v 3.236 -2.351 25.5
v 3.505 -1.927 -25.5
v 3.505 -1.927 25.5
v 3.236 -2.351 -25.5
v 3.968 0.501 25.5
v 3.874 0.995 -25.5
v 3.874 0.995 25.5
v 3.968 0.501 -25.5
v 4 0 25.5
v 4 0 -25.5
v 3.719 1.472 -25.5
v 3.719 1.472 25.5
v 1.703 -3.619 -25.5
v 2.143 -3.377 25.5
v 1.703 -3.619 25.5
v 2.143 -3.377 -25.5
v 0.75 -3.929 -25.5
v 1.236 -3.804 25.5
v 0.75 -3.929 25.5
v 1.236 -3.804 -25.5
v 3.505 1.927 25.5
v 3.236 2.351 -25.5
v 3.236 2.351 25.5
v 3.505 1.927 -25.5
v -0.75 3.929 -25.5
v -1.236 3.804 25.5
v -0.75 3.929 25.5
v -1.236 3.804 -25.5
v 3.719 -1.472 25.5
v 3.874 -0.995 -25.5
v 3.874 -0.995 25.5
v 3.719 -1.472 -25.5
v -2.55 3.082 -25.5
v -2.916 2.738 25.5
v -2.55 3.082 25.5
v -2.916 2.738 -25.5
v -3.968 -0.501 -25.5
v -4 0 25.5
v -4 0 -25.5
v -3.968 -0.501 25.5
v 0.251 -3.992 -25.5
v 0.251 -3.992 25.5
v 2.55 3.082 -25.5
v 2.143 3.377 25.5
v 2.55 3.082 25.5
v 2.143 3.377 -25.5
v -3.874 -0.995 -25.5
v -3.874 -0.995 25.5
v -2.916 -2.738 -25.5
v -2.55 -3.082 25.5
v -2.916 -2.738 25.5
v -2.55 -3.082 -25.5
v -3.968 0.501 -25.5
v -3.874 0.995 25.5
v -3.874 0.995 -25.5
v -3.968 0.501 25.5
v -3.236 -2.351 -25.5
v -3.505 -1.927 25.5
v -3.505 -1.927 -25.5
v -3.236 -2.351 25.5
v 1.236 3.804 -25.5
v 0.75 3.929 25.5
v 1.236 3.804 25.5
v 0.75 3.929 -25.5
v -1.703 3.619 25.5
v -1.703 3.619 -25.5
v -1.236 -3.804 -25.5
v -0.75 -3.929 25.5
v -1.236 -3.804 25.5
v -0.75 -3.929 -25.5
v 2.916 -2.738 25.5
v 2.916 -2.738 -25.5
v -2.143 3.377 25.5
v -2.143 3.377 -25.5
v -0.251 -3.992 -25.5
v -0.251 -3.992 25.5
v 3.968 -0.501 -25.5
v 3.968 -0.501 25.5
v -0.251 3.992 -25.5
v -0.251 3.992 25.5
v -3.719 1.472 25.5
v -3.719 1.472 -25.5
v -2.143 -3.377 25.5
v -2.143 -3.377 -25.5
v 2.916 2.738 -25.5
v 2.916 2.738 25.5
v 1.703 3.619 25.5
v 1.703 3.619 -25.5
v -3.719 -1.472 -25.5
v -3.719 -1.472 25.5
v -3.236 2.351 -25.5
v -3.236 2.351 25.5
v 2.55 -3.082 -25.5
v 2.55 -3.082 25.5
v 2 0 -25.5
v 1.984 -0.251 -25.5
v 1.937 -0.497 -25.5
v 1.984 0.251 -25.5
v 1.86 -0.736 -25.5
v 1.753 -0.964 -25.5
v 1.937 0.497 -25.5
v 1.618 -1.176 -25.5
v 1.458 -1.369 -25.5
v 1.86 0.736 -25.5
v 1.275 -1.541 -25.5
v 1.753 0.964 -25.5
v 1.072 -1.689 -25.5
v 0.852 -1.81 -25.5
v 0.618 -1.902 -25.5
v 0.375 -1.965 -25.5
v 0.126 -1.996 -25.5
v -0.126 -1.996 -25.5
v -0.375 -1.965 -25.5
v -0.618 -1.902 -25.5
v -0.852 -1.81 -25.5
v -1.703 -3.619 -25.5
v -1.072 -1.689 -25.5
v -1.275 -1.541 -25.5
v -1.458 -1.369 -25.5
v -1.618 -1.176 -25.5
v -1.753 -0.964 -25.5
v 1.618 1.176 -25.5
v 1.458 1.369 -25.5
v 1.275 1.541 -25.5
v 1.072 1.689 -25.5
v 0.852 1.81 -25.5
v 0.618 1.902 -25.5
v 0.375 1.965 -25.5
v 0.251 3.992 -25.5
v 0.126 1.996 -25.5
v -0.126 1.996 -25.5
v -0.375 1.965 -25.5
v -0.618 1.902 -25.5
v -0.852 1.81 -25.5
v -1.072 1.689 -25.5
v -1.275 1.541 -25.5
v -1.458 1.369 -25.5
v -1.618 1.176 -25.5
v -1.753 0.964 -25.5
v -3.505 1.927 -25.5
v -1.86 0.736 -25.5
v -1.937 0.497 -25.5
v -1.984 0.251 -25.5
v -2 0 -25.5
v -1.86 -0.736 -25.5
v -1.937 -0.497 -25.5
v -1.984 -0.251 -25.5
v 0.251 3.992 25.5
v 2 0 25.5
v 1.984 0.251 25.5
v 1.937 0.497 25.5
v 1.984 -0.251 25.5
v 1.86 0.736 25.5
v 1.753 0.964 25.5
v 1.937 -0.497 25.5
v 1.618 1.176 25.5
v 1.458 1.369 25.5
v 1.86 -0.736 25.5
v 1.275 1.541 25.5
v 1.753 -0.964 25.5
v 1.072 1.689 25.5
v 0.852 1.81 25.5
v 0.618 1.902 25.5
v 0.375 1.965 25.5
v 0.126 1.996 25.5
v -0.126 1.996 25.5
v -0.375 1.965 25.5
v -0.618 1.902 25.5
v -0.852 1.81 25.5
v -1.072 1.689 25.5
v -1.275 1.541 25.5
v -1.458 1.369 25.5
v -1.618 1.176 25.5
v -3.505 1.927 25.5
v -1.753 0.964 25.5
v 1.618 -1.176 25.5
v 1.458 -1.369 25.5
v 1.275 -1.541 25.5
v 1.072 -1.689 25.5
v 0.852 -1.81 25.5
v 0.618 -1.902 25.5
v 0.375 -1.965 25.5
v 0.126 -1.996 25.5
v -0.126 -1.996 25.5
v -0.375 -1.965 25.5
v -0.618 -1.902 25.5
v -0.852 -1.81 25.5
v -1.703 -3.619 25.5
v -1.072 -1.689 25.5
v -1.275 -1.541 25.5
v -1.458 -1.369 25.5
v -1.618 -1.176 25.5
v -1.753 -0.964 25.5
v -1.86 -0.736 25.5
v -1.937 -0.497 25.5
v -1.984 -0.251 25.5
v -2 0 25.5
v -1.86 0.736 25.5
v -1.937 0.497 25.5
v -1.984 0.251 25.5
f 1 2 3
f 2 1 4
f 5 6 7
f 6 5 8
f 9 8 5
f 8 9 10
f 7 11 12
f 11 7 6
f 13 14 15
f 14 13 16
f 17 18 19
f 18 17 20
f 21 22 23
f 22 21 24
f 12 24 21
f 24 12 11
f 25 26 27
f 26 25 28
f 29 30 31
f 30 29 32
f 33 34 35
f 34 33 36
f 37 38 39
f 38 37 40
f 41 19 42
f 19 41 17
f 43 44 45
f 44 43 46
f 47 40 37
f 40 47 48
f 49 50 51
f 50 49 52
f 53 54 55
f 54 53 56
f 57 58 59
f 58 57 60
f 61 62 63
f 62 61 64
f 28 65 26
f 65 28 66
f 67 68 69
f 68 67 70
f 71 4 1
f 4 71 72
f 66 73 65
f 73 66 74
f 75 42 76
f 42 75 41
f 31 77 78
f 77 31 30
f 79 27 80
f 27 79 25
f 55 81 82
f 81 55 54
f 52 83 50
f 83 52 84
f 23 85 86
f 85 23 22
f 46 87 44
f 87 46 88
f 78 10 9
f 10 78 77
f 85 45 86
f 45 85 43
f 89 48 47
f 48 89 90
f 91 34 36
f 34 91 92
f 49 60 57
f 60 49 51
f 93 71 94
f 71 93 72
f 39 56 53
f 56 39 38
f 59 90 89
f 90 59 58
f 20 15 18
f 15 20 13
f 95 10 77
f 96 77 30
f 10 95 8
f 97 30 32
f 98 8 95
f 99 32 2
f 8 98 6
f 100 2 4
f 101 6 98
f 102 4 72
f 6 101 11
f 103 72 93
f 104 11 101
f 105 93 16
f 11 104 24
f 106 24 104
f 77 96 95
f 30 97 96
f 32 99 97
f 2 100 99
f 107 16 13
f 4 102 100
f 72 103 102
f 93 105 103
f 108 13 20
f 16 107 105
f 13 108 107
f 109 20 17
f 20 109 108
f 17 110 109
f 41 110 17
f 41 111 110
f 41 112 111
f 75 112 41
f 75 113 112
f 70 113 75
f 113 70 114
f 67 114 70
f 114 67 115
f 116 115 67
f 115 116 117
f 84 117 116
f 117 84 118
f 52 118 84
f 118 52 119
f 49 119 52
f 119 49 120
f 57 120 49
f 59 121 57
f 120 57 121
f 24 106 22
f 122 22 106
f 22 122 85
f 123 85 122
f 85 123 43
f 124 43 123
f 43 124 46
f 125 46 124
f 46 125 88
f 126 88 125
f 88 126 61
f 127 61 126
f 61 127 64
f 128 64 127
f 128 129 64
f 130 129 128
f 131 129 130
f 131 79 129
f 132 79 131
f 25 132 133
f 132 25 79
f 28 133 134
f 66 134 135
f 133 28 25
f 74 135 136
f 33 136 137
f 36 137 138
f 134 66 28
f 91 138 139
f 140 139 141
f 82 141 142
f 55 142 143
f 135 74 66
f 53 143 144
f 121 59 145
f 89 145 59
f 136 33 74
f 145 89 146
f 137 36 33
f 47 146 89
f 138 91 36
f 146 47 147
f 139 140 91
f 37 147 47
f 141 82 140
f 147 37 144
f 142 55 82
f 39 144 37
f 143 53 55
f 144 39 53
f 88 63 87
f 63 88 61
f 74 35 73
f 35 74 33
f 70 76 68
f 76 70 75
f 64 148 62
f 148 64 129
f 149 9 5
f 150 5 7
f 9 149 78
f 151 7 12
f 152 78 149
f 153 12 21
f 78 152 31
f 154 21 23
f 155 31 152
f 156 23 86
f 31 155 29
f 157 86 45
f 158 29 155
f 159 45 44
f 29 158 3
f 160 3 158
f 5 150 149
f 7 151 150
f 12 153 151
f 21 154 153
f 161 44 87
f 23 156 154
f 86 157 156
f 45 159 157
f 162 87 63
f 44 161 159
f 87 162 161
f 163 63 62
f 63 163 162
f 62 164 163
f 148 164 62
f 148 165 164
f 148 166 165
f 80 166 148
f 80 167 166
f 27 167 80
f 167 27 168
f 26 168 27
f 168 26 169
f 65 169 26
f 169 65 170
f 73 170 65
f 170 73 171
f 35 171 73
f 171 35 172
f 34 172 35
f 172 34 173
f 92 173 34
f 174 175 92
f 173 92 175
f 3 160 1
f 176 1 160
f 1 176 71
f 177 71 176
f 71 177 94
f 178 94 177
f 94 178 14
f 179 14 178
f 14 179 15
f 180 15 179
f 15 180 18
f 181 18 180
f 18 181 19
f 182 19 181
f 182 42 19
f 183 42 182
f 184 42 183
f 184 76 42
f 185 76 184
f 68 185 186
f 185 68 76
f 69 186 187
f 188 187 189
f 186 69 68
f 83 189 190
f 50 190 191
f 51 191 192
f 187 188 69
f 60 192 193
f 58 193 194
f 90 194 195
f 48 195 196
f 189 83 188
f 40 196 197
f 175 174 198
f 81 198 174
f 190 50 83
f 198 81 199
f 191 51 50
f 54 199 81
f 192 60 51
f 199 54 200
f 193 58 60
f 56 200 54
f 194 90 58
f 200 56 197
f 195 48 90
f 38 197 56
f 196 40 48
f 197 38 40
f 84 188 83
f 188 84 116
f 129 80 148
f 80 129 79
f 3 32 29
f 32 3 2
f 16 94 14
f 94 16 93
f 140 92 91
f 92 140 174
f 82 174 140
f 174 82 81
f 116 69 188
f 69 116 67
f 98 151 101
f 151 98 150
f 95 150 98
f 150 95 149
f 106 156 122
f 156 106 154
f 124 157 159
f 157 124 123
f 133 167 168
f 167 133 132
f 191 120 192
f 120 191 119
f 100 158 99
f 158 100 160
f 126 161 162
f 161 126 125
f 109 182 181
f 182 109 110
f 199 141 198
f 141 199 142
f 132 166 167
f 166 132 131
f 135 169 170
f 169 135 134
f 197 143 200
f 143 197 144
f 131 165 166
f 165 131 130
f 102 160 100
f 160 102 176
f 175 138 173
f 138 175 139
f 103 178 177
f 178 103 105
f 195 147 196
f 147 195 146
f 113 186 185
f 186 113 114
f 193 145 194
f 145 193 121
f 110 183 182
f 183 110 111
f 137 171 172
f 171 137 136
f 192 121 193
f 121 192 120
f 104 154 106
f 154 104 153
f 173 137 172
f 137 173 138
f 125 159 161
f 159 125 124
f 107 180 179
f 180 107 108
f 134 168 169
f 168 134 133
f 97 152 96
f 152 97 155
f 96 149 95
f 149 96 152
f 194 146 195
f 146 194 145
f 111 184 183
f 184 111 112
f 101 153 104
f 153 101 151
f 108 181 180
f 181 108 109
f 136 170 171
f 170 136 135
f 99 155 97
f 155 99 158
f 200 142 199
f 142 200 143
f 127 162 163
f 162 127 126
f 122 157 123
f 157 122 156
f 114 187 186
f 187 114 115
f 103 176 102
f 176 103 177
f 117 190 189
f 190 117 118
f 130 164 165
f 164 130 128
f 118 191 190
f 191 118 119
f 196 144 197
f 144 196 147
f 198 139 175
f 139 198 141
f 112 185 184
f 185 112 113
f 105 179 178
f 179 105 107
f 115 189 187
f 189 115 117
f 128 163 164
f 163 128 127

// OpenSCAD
$fn = 50;


difference() {
	union() {
		translate(v = [0, 0, -25.5000000000]) {
			cylinder(h = 51, r = 4.0000000000);
		}
	}
	union() {
		translate(v = [0, 0, -100.0000000000]) {
			cylinder(h = 200, r = 2.0000000000);
		}
	}
}
